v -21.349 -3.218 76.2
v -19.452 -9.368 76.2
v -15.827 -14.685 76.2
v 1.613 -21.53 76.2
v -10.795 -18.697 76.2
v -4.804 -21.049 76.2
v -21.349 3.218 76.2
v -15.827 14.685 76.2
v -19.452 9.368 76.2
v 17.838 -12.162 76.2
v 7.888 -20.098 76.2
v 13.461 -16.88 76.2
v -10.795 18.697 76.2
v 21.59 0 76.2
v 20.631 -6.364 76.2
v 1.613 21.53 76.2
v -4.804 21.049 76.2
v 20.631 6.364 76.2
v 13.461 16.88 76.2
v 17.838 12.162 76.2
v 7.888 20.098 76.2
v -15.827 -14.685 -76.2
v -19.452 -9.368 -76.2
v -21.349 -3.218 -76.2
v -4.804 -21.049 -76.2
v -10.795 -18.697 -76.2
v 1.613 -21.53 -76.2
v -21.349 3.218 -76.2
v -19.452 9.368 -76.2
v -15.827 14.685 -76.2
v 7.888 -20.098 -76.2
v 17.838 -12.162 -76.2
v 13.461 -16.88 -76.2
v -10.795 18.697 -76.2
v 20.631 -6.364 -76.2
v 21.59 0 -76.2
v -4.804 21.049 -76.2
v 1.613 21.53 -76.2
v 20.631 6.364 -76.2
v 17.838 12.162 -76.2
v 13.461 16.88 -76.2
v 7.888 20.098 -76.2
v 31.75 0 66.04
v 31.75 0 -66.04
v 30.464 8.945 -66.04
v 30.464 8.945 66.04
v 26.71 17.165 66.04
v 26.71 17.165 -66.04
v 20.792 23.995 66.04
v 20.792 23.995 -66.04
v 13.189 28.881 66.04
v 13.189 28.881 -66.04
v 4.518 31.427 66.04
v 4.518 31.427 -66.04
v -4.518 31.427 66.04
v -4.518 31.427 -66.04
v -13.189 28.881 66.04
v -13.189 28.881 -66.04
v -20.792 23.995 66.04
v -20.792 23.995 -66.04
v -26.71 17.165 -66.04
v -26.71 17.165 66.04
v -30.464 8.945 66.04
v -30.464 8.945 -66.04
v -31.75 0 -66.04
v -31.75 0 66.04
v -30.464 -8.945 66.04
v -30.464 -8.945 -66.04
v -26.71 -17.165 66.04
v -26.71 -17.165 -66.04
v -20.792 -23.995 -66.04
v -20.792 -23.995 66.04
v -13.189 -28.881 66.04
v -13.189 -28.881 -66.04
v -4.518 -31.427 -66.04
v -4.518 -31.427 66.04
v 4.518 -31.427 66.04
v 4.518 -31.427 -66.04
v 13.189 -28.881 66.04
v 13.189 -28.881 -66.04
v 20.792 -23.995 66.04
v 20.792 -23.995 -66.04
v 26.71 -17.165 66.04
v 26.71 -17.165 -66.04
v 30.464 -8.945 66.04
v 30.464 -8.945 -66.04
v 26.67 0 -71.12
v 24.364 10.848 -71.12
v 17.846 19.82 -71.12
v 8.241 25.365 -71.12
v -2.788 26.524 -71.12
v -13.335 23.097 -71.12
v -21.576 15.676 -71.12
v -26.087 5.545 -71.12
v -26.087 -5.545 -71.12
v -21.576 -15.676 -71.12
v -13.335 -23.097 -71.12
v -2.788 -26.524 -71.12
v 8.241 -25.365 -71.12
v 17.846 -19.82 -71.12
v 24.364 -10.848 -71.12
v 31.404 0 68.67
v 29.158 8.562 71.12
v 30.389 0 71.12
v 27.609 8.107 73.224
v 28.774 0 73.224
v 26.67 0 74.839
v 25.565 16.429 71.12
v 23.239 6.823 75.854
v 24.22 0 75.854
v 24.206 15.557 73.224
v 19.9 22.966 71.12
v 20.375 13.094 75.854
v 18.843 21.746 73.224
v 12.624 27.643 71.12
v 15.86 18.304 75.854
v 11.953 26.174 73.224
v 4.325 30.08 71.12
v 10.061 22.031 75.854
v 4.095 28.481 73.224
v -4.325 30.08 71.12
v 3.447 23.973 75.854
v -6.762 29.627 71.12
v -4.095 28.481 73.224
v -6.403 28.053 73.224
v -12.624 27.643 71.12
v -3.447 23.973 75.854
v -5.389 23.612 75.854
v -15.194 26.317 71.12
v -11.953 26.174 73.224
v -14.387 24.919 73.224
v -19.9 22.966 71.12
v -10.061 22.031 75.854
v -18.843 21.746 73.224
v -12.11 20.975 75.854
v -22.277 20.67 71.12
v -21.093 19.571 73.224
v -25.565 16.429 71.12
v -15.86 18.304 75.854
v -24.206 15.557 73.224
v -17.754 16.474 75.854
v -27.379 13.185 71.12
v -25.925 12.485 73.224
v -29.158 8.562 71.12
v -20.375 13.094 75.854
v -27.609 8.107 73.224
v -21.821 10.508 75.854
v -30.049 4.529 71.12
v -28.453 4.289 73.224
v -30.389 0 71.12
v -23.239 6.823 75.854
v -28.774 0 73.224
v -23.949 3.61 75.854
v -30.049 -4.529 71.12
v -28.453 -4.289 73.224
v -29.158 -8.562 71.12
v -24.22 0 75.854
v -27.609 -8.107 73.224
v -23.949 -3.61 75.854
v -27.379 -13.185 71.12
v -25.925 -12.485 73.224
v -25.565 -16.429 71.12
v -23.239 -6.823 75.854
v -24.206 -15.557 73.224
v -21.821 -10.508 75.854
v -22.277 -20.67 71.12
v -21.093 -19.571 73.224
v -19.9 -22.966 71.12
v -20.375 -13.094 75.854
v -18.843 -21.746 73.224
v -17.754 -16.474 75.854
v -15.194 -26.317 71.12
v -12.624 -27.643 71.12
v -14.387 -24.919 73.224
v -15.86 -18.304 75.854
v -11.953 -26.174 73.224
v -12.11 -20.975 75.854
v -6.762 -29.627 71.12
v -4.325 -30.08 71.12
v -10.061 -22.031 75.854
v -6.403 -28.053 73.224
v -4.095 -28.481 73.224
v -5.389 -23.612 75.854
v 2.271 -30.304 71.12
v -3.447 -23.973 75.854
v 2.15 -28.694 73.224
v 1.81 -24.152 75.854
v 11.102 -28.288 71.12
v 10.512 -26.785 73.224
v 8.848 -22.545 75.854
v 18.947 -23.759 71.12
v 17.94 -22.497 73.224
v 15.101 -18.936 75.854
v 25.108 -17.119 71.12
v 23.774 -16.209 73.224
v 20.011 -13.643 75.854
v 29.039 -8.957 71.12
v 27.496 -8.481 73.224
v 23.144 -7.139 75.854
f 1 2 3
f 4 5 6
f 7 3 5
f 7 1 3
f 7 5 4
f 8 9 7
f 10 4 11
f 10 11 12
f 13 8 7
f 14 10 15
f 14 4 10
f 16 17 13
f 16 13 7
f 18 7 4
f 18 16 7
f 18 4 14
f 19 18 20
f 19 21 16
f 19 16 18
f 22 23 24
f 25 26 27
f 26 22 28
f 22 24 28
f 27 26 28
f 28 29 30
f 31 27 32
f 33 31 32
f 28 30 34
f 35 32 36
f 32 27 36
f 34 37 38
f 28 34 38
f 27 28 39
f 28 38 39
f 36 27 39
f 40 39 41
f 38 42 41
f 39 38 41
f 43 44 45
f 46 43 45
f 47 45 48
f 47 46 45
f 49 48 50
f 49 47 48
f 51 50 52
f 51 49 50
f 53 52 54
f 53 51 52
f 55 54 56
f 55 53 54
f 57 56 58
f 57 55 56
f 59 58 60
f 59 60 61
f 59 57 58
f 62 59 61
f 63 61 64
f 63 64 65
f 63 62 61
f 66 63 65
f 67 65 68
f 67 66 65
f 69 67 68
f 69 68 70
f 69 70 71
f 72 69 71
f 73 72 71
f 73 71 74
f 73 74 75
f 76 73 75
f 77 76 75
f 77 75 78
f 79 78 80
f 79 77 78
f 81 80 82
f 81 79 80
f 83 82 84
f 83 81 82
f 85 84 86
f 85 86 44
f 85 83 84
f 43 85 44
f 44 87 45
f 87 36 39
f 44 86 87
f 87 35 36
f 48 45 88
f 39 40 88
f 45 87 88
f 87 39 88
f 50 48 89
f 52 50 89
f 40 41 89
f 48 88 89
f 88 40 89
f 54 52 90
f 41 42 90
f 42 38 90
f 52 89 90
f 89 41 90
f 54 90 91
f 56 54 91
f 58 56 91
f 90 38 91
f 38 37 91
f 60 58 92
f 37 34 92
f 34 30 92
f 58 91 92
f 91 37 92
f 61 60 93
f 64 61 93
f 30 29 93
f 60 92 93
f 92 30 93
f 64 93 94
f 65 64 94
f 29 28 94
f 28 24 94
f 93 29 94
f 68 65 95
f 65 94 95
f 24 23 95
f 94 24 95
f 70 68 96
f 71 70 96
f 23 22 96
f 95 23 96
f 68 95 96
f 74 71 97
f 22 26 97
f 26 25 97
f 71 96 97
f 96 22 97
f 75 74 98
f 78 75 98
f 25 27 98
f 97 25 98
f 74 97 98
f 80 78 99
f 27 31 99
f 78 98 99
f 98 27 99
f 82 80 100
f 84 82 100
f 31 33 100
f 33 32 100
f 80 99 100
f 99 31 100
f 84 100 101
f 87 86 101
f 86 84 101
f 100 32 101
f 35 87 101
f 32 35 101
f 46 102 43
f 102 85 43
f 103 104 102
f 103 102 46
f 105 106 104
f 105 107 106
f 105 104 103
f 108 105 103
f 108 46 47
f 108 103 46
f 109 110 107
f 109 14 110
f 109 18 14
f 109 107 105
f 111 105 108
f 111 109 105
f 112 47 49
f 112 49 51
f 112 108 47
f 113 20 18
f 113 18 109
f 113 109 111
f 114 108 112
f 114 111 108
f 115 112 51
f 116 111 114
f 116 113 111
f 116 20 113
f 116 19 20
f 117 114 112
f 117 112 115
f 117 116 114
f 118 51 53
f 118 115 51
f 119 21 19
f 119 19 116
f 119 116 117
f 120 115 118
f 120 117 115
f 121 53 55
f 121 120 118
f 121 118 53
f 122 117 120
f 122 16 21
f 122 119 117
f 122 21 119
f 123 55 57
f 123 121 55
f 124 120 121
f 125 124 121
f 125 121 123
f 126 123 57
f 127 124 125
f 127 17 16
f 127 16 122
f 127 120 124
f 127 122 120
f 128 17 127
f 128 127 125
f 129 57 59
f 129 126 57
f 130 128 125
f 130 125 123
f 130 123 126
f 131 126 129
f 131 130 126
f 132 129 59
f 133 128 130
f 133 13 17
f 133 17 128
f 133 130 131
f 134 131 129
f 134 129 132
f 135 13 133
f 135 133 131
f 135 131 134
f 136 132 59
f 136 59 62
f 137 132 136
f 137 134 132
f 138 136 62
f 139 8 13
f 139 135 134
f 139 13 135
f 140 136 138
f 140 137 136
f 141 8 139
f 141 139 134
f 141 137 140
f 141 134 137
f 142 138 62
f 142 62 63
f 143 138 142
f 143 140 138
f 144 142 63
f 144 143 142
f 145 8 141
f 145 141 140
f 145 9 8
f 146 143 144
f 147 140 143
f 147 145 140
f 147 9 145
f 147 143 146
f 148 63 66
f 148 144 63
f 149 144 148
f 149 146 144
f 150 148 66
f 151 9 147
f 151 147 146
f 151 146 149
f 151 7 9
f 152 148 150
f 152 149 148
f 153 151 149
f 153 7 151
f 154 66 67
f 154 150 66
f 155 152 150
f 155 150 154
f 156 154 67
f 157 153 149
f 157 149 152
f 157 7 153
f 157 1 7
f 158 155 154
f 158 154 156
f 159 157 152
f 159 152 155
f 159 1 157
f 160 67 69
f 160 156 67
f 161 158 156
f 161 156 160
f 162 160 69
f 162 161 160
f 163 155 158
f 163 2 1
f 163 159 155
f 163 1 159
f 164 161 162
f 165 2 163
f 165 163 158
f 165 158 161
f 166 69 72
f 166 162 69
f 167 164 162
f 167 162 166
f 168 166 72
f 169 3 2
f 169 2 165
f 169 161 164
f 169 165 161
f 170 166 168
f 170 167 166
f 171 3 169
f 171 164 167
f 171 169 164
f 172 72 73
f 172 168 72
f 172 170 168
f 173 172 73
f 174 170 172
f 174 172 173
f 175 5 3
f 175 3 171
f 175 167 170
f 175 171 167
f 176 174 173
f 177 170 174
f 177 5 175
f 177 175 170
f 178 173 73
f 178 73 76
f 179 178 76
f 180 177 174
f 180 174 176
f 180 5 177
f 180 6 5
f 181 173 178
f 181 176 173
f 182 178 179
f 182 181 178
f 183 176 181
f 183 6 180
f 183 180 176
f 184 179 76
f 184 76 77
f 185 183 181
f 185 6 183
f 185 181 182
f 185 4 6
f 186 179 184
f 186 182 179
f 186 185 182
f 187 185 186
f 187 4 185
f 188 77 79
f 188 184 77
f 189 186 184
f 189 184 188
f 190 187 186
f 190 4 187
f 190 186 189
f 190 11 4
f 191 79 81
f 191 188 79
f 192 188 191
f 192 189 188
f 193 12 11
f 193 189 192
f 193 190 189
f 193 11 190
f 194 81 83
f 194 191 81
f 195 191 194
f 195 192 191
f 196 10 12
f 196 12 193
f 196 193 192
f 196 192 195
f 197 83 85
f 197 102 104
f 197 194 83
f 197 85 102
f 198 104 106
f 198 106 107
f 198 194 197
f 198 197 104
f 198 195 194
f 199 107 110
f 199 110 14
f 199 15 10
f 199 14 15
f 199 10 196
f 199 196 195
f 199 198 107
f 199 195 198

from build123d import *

# Parameters (mm, degrees)
F0_R          = 31.75
F1_DEPTH      = 76.2
F1_DEPTH_BACK = 76.2
F2_R          = 10.16
F3_SIZE       = 10.16


with BuildPart() as f1:
    # F0 (on Top) → F1 (new body, two sides)
    with BuildSketch(Plane.XY) as f1_sk:
        Circle(F0_R)
    extrude(amount=-F1_DEPTH)
    extrude(f1_sk.sketch, amount=F1_DEPTH_BACK)

    # F2
    f2_edges = [f1.edges().sort_by_distance(p)[0] for p in [
        (-31.75, 0, 76.2),
    ]]
    fillet(f2_edges, radius=F2_R)

    # F3
    f3_edges = [f1.edges().sort_by_distance(p)[0] for p in [
        (-31.75, 0, -76.2),
    ]]
    chamfer(f3_edges, length=F3_SIZE)


solid = f1.part
